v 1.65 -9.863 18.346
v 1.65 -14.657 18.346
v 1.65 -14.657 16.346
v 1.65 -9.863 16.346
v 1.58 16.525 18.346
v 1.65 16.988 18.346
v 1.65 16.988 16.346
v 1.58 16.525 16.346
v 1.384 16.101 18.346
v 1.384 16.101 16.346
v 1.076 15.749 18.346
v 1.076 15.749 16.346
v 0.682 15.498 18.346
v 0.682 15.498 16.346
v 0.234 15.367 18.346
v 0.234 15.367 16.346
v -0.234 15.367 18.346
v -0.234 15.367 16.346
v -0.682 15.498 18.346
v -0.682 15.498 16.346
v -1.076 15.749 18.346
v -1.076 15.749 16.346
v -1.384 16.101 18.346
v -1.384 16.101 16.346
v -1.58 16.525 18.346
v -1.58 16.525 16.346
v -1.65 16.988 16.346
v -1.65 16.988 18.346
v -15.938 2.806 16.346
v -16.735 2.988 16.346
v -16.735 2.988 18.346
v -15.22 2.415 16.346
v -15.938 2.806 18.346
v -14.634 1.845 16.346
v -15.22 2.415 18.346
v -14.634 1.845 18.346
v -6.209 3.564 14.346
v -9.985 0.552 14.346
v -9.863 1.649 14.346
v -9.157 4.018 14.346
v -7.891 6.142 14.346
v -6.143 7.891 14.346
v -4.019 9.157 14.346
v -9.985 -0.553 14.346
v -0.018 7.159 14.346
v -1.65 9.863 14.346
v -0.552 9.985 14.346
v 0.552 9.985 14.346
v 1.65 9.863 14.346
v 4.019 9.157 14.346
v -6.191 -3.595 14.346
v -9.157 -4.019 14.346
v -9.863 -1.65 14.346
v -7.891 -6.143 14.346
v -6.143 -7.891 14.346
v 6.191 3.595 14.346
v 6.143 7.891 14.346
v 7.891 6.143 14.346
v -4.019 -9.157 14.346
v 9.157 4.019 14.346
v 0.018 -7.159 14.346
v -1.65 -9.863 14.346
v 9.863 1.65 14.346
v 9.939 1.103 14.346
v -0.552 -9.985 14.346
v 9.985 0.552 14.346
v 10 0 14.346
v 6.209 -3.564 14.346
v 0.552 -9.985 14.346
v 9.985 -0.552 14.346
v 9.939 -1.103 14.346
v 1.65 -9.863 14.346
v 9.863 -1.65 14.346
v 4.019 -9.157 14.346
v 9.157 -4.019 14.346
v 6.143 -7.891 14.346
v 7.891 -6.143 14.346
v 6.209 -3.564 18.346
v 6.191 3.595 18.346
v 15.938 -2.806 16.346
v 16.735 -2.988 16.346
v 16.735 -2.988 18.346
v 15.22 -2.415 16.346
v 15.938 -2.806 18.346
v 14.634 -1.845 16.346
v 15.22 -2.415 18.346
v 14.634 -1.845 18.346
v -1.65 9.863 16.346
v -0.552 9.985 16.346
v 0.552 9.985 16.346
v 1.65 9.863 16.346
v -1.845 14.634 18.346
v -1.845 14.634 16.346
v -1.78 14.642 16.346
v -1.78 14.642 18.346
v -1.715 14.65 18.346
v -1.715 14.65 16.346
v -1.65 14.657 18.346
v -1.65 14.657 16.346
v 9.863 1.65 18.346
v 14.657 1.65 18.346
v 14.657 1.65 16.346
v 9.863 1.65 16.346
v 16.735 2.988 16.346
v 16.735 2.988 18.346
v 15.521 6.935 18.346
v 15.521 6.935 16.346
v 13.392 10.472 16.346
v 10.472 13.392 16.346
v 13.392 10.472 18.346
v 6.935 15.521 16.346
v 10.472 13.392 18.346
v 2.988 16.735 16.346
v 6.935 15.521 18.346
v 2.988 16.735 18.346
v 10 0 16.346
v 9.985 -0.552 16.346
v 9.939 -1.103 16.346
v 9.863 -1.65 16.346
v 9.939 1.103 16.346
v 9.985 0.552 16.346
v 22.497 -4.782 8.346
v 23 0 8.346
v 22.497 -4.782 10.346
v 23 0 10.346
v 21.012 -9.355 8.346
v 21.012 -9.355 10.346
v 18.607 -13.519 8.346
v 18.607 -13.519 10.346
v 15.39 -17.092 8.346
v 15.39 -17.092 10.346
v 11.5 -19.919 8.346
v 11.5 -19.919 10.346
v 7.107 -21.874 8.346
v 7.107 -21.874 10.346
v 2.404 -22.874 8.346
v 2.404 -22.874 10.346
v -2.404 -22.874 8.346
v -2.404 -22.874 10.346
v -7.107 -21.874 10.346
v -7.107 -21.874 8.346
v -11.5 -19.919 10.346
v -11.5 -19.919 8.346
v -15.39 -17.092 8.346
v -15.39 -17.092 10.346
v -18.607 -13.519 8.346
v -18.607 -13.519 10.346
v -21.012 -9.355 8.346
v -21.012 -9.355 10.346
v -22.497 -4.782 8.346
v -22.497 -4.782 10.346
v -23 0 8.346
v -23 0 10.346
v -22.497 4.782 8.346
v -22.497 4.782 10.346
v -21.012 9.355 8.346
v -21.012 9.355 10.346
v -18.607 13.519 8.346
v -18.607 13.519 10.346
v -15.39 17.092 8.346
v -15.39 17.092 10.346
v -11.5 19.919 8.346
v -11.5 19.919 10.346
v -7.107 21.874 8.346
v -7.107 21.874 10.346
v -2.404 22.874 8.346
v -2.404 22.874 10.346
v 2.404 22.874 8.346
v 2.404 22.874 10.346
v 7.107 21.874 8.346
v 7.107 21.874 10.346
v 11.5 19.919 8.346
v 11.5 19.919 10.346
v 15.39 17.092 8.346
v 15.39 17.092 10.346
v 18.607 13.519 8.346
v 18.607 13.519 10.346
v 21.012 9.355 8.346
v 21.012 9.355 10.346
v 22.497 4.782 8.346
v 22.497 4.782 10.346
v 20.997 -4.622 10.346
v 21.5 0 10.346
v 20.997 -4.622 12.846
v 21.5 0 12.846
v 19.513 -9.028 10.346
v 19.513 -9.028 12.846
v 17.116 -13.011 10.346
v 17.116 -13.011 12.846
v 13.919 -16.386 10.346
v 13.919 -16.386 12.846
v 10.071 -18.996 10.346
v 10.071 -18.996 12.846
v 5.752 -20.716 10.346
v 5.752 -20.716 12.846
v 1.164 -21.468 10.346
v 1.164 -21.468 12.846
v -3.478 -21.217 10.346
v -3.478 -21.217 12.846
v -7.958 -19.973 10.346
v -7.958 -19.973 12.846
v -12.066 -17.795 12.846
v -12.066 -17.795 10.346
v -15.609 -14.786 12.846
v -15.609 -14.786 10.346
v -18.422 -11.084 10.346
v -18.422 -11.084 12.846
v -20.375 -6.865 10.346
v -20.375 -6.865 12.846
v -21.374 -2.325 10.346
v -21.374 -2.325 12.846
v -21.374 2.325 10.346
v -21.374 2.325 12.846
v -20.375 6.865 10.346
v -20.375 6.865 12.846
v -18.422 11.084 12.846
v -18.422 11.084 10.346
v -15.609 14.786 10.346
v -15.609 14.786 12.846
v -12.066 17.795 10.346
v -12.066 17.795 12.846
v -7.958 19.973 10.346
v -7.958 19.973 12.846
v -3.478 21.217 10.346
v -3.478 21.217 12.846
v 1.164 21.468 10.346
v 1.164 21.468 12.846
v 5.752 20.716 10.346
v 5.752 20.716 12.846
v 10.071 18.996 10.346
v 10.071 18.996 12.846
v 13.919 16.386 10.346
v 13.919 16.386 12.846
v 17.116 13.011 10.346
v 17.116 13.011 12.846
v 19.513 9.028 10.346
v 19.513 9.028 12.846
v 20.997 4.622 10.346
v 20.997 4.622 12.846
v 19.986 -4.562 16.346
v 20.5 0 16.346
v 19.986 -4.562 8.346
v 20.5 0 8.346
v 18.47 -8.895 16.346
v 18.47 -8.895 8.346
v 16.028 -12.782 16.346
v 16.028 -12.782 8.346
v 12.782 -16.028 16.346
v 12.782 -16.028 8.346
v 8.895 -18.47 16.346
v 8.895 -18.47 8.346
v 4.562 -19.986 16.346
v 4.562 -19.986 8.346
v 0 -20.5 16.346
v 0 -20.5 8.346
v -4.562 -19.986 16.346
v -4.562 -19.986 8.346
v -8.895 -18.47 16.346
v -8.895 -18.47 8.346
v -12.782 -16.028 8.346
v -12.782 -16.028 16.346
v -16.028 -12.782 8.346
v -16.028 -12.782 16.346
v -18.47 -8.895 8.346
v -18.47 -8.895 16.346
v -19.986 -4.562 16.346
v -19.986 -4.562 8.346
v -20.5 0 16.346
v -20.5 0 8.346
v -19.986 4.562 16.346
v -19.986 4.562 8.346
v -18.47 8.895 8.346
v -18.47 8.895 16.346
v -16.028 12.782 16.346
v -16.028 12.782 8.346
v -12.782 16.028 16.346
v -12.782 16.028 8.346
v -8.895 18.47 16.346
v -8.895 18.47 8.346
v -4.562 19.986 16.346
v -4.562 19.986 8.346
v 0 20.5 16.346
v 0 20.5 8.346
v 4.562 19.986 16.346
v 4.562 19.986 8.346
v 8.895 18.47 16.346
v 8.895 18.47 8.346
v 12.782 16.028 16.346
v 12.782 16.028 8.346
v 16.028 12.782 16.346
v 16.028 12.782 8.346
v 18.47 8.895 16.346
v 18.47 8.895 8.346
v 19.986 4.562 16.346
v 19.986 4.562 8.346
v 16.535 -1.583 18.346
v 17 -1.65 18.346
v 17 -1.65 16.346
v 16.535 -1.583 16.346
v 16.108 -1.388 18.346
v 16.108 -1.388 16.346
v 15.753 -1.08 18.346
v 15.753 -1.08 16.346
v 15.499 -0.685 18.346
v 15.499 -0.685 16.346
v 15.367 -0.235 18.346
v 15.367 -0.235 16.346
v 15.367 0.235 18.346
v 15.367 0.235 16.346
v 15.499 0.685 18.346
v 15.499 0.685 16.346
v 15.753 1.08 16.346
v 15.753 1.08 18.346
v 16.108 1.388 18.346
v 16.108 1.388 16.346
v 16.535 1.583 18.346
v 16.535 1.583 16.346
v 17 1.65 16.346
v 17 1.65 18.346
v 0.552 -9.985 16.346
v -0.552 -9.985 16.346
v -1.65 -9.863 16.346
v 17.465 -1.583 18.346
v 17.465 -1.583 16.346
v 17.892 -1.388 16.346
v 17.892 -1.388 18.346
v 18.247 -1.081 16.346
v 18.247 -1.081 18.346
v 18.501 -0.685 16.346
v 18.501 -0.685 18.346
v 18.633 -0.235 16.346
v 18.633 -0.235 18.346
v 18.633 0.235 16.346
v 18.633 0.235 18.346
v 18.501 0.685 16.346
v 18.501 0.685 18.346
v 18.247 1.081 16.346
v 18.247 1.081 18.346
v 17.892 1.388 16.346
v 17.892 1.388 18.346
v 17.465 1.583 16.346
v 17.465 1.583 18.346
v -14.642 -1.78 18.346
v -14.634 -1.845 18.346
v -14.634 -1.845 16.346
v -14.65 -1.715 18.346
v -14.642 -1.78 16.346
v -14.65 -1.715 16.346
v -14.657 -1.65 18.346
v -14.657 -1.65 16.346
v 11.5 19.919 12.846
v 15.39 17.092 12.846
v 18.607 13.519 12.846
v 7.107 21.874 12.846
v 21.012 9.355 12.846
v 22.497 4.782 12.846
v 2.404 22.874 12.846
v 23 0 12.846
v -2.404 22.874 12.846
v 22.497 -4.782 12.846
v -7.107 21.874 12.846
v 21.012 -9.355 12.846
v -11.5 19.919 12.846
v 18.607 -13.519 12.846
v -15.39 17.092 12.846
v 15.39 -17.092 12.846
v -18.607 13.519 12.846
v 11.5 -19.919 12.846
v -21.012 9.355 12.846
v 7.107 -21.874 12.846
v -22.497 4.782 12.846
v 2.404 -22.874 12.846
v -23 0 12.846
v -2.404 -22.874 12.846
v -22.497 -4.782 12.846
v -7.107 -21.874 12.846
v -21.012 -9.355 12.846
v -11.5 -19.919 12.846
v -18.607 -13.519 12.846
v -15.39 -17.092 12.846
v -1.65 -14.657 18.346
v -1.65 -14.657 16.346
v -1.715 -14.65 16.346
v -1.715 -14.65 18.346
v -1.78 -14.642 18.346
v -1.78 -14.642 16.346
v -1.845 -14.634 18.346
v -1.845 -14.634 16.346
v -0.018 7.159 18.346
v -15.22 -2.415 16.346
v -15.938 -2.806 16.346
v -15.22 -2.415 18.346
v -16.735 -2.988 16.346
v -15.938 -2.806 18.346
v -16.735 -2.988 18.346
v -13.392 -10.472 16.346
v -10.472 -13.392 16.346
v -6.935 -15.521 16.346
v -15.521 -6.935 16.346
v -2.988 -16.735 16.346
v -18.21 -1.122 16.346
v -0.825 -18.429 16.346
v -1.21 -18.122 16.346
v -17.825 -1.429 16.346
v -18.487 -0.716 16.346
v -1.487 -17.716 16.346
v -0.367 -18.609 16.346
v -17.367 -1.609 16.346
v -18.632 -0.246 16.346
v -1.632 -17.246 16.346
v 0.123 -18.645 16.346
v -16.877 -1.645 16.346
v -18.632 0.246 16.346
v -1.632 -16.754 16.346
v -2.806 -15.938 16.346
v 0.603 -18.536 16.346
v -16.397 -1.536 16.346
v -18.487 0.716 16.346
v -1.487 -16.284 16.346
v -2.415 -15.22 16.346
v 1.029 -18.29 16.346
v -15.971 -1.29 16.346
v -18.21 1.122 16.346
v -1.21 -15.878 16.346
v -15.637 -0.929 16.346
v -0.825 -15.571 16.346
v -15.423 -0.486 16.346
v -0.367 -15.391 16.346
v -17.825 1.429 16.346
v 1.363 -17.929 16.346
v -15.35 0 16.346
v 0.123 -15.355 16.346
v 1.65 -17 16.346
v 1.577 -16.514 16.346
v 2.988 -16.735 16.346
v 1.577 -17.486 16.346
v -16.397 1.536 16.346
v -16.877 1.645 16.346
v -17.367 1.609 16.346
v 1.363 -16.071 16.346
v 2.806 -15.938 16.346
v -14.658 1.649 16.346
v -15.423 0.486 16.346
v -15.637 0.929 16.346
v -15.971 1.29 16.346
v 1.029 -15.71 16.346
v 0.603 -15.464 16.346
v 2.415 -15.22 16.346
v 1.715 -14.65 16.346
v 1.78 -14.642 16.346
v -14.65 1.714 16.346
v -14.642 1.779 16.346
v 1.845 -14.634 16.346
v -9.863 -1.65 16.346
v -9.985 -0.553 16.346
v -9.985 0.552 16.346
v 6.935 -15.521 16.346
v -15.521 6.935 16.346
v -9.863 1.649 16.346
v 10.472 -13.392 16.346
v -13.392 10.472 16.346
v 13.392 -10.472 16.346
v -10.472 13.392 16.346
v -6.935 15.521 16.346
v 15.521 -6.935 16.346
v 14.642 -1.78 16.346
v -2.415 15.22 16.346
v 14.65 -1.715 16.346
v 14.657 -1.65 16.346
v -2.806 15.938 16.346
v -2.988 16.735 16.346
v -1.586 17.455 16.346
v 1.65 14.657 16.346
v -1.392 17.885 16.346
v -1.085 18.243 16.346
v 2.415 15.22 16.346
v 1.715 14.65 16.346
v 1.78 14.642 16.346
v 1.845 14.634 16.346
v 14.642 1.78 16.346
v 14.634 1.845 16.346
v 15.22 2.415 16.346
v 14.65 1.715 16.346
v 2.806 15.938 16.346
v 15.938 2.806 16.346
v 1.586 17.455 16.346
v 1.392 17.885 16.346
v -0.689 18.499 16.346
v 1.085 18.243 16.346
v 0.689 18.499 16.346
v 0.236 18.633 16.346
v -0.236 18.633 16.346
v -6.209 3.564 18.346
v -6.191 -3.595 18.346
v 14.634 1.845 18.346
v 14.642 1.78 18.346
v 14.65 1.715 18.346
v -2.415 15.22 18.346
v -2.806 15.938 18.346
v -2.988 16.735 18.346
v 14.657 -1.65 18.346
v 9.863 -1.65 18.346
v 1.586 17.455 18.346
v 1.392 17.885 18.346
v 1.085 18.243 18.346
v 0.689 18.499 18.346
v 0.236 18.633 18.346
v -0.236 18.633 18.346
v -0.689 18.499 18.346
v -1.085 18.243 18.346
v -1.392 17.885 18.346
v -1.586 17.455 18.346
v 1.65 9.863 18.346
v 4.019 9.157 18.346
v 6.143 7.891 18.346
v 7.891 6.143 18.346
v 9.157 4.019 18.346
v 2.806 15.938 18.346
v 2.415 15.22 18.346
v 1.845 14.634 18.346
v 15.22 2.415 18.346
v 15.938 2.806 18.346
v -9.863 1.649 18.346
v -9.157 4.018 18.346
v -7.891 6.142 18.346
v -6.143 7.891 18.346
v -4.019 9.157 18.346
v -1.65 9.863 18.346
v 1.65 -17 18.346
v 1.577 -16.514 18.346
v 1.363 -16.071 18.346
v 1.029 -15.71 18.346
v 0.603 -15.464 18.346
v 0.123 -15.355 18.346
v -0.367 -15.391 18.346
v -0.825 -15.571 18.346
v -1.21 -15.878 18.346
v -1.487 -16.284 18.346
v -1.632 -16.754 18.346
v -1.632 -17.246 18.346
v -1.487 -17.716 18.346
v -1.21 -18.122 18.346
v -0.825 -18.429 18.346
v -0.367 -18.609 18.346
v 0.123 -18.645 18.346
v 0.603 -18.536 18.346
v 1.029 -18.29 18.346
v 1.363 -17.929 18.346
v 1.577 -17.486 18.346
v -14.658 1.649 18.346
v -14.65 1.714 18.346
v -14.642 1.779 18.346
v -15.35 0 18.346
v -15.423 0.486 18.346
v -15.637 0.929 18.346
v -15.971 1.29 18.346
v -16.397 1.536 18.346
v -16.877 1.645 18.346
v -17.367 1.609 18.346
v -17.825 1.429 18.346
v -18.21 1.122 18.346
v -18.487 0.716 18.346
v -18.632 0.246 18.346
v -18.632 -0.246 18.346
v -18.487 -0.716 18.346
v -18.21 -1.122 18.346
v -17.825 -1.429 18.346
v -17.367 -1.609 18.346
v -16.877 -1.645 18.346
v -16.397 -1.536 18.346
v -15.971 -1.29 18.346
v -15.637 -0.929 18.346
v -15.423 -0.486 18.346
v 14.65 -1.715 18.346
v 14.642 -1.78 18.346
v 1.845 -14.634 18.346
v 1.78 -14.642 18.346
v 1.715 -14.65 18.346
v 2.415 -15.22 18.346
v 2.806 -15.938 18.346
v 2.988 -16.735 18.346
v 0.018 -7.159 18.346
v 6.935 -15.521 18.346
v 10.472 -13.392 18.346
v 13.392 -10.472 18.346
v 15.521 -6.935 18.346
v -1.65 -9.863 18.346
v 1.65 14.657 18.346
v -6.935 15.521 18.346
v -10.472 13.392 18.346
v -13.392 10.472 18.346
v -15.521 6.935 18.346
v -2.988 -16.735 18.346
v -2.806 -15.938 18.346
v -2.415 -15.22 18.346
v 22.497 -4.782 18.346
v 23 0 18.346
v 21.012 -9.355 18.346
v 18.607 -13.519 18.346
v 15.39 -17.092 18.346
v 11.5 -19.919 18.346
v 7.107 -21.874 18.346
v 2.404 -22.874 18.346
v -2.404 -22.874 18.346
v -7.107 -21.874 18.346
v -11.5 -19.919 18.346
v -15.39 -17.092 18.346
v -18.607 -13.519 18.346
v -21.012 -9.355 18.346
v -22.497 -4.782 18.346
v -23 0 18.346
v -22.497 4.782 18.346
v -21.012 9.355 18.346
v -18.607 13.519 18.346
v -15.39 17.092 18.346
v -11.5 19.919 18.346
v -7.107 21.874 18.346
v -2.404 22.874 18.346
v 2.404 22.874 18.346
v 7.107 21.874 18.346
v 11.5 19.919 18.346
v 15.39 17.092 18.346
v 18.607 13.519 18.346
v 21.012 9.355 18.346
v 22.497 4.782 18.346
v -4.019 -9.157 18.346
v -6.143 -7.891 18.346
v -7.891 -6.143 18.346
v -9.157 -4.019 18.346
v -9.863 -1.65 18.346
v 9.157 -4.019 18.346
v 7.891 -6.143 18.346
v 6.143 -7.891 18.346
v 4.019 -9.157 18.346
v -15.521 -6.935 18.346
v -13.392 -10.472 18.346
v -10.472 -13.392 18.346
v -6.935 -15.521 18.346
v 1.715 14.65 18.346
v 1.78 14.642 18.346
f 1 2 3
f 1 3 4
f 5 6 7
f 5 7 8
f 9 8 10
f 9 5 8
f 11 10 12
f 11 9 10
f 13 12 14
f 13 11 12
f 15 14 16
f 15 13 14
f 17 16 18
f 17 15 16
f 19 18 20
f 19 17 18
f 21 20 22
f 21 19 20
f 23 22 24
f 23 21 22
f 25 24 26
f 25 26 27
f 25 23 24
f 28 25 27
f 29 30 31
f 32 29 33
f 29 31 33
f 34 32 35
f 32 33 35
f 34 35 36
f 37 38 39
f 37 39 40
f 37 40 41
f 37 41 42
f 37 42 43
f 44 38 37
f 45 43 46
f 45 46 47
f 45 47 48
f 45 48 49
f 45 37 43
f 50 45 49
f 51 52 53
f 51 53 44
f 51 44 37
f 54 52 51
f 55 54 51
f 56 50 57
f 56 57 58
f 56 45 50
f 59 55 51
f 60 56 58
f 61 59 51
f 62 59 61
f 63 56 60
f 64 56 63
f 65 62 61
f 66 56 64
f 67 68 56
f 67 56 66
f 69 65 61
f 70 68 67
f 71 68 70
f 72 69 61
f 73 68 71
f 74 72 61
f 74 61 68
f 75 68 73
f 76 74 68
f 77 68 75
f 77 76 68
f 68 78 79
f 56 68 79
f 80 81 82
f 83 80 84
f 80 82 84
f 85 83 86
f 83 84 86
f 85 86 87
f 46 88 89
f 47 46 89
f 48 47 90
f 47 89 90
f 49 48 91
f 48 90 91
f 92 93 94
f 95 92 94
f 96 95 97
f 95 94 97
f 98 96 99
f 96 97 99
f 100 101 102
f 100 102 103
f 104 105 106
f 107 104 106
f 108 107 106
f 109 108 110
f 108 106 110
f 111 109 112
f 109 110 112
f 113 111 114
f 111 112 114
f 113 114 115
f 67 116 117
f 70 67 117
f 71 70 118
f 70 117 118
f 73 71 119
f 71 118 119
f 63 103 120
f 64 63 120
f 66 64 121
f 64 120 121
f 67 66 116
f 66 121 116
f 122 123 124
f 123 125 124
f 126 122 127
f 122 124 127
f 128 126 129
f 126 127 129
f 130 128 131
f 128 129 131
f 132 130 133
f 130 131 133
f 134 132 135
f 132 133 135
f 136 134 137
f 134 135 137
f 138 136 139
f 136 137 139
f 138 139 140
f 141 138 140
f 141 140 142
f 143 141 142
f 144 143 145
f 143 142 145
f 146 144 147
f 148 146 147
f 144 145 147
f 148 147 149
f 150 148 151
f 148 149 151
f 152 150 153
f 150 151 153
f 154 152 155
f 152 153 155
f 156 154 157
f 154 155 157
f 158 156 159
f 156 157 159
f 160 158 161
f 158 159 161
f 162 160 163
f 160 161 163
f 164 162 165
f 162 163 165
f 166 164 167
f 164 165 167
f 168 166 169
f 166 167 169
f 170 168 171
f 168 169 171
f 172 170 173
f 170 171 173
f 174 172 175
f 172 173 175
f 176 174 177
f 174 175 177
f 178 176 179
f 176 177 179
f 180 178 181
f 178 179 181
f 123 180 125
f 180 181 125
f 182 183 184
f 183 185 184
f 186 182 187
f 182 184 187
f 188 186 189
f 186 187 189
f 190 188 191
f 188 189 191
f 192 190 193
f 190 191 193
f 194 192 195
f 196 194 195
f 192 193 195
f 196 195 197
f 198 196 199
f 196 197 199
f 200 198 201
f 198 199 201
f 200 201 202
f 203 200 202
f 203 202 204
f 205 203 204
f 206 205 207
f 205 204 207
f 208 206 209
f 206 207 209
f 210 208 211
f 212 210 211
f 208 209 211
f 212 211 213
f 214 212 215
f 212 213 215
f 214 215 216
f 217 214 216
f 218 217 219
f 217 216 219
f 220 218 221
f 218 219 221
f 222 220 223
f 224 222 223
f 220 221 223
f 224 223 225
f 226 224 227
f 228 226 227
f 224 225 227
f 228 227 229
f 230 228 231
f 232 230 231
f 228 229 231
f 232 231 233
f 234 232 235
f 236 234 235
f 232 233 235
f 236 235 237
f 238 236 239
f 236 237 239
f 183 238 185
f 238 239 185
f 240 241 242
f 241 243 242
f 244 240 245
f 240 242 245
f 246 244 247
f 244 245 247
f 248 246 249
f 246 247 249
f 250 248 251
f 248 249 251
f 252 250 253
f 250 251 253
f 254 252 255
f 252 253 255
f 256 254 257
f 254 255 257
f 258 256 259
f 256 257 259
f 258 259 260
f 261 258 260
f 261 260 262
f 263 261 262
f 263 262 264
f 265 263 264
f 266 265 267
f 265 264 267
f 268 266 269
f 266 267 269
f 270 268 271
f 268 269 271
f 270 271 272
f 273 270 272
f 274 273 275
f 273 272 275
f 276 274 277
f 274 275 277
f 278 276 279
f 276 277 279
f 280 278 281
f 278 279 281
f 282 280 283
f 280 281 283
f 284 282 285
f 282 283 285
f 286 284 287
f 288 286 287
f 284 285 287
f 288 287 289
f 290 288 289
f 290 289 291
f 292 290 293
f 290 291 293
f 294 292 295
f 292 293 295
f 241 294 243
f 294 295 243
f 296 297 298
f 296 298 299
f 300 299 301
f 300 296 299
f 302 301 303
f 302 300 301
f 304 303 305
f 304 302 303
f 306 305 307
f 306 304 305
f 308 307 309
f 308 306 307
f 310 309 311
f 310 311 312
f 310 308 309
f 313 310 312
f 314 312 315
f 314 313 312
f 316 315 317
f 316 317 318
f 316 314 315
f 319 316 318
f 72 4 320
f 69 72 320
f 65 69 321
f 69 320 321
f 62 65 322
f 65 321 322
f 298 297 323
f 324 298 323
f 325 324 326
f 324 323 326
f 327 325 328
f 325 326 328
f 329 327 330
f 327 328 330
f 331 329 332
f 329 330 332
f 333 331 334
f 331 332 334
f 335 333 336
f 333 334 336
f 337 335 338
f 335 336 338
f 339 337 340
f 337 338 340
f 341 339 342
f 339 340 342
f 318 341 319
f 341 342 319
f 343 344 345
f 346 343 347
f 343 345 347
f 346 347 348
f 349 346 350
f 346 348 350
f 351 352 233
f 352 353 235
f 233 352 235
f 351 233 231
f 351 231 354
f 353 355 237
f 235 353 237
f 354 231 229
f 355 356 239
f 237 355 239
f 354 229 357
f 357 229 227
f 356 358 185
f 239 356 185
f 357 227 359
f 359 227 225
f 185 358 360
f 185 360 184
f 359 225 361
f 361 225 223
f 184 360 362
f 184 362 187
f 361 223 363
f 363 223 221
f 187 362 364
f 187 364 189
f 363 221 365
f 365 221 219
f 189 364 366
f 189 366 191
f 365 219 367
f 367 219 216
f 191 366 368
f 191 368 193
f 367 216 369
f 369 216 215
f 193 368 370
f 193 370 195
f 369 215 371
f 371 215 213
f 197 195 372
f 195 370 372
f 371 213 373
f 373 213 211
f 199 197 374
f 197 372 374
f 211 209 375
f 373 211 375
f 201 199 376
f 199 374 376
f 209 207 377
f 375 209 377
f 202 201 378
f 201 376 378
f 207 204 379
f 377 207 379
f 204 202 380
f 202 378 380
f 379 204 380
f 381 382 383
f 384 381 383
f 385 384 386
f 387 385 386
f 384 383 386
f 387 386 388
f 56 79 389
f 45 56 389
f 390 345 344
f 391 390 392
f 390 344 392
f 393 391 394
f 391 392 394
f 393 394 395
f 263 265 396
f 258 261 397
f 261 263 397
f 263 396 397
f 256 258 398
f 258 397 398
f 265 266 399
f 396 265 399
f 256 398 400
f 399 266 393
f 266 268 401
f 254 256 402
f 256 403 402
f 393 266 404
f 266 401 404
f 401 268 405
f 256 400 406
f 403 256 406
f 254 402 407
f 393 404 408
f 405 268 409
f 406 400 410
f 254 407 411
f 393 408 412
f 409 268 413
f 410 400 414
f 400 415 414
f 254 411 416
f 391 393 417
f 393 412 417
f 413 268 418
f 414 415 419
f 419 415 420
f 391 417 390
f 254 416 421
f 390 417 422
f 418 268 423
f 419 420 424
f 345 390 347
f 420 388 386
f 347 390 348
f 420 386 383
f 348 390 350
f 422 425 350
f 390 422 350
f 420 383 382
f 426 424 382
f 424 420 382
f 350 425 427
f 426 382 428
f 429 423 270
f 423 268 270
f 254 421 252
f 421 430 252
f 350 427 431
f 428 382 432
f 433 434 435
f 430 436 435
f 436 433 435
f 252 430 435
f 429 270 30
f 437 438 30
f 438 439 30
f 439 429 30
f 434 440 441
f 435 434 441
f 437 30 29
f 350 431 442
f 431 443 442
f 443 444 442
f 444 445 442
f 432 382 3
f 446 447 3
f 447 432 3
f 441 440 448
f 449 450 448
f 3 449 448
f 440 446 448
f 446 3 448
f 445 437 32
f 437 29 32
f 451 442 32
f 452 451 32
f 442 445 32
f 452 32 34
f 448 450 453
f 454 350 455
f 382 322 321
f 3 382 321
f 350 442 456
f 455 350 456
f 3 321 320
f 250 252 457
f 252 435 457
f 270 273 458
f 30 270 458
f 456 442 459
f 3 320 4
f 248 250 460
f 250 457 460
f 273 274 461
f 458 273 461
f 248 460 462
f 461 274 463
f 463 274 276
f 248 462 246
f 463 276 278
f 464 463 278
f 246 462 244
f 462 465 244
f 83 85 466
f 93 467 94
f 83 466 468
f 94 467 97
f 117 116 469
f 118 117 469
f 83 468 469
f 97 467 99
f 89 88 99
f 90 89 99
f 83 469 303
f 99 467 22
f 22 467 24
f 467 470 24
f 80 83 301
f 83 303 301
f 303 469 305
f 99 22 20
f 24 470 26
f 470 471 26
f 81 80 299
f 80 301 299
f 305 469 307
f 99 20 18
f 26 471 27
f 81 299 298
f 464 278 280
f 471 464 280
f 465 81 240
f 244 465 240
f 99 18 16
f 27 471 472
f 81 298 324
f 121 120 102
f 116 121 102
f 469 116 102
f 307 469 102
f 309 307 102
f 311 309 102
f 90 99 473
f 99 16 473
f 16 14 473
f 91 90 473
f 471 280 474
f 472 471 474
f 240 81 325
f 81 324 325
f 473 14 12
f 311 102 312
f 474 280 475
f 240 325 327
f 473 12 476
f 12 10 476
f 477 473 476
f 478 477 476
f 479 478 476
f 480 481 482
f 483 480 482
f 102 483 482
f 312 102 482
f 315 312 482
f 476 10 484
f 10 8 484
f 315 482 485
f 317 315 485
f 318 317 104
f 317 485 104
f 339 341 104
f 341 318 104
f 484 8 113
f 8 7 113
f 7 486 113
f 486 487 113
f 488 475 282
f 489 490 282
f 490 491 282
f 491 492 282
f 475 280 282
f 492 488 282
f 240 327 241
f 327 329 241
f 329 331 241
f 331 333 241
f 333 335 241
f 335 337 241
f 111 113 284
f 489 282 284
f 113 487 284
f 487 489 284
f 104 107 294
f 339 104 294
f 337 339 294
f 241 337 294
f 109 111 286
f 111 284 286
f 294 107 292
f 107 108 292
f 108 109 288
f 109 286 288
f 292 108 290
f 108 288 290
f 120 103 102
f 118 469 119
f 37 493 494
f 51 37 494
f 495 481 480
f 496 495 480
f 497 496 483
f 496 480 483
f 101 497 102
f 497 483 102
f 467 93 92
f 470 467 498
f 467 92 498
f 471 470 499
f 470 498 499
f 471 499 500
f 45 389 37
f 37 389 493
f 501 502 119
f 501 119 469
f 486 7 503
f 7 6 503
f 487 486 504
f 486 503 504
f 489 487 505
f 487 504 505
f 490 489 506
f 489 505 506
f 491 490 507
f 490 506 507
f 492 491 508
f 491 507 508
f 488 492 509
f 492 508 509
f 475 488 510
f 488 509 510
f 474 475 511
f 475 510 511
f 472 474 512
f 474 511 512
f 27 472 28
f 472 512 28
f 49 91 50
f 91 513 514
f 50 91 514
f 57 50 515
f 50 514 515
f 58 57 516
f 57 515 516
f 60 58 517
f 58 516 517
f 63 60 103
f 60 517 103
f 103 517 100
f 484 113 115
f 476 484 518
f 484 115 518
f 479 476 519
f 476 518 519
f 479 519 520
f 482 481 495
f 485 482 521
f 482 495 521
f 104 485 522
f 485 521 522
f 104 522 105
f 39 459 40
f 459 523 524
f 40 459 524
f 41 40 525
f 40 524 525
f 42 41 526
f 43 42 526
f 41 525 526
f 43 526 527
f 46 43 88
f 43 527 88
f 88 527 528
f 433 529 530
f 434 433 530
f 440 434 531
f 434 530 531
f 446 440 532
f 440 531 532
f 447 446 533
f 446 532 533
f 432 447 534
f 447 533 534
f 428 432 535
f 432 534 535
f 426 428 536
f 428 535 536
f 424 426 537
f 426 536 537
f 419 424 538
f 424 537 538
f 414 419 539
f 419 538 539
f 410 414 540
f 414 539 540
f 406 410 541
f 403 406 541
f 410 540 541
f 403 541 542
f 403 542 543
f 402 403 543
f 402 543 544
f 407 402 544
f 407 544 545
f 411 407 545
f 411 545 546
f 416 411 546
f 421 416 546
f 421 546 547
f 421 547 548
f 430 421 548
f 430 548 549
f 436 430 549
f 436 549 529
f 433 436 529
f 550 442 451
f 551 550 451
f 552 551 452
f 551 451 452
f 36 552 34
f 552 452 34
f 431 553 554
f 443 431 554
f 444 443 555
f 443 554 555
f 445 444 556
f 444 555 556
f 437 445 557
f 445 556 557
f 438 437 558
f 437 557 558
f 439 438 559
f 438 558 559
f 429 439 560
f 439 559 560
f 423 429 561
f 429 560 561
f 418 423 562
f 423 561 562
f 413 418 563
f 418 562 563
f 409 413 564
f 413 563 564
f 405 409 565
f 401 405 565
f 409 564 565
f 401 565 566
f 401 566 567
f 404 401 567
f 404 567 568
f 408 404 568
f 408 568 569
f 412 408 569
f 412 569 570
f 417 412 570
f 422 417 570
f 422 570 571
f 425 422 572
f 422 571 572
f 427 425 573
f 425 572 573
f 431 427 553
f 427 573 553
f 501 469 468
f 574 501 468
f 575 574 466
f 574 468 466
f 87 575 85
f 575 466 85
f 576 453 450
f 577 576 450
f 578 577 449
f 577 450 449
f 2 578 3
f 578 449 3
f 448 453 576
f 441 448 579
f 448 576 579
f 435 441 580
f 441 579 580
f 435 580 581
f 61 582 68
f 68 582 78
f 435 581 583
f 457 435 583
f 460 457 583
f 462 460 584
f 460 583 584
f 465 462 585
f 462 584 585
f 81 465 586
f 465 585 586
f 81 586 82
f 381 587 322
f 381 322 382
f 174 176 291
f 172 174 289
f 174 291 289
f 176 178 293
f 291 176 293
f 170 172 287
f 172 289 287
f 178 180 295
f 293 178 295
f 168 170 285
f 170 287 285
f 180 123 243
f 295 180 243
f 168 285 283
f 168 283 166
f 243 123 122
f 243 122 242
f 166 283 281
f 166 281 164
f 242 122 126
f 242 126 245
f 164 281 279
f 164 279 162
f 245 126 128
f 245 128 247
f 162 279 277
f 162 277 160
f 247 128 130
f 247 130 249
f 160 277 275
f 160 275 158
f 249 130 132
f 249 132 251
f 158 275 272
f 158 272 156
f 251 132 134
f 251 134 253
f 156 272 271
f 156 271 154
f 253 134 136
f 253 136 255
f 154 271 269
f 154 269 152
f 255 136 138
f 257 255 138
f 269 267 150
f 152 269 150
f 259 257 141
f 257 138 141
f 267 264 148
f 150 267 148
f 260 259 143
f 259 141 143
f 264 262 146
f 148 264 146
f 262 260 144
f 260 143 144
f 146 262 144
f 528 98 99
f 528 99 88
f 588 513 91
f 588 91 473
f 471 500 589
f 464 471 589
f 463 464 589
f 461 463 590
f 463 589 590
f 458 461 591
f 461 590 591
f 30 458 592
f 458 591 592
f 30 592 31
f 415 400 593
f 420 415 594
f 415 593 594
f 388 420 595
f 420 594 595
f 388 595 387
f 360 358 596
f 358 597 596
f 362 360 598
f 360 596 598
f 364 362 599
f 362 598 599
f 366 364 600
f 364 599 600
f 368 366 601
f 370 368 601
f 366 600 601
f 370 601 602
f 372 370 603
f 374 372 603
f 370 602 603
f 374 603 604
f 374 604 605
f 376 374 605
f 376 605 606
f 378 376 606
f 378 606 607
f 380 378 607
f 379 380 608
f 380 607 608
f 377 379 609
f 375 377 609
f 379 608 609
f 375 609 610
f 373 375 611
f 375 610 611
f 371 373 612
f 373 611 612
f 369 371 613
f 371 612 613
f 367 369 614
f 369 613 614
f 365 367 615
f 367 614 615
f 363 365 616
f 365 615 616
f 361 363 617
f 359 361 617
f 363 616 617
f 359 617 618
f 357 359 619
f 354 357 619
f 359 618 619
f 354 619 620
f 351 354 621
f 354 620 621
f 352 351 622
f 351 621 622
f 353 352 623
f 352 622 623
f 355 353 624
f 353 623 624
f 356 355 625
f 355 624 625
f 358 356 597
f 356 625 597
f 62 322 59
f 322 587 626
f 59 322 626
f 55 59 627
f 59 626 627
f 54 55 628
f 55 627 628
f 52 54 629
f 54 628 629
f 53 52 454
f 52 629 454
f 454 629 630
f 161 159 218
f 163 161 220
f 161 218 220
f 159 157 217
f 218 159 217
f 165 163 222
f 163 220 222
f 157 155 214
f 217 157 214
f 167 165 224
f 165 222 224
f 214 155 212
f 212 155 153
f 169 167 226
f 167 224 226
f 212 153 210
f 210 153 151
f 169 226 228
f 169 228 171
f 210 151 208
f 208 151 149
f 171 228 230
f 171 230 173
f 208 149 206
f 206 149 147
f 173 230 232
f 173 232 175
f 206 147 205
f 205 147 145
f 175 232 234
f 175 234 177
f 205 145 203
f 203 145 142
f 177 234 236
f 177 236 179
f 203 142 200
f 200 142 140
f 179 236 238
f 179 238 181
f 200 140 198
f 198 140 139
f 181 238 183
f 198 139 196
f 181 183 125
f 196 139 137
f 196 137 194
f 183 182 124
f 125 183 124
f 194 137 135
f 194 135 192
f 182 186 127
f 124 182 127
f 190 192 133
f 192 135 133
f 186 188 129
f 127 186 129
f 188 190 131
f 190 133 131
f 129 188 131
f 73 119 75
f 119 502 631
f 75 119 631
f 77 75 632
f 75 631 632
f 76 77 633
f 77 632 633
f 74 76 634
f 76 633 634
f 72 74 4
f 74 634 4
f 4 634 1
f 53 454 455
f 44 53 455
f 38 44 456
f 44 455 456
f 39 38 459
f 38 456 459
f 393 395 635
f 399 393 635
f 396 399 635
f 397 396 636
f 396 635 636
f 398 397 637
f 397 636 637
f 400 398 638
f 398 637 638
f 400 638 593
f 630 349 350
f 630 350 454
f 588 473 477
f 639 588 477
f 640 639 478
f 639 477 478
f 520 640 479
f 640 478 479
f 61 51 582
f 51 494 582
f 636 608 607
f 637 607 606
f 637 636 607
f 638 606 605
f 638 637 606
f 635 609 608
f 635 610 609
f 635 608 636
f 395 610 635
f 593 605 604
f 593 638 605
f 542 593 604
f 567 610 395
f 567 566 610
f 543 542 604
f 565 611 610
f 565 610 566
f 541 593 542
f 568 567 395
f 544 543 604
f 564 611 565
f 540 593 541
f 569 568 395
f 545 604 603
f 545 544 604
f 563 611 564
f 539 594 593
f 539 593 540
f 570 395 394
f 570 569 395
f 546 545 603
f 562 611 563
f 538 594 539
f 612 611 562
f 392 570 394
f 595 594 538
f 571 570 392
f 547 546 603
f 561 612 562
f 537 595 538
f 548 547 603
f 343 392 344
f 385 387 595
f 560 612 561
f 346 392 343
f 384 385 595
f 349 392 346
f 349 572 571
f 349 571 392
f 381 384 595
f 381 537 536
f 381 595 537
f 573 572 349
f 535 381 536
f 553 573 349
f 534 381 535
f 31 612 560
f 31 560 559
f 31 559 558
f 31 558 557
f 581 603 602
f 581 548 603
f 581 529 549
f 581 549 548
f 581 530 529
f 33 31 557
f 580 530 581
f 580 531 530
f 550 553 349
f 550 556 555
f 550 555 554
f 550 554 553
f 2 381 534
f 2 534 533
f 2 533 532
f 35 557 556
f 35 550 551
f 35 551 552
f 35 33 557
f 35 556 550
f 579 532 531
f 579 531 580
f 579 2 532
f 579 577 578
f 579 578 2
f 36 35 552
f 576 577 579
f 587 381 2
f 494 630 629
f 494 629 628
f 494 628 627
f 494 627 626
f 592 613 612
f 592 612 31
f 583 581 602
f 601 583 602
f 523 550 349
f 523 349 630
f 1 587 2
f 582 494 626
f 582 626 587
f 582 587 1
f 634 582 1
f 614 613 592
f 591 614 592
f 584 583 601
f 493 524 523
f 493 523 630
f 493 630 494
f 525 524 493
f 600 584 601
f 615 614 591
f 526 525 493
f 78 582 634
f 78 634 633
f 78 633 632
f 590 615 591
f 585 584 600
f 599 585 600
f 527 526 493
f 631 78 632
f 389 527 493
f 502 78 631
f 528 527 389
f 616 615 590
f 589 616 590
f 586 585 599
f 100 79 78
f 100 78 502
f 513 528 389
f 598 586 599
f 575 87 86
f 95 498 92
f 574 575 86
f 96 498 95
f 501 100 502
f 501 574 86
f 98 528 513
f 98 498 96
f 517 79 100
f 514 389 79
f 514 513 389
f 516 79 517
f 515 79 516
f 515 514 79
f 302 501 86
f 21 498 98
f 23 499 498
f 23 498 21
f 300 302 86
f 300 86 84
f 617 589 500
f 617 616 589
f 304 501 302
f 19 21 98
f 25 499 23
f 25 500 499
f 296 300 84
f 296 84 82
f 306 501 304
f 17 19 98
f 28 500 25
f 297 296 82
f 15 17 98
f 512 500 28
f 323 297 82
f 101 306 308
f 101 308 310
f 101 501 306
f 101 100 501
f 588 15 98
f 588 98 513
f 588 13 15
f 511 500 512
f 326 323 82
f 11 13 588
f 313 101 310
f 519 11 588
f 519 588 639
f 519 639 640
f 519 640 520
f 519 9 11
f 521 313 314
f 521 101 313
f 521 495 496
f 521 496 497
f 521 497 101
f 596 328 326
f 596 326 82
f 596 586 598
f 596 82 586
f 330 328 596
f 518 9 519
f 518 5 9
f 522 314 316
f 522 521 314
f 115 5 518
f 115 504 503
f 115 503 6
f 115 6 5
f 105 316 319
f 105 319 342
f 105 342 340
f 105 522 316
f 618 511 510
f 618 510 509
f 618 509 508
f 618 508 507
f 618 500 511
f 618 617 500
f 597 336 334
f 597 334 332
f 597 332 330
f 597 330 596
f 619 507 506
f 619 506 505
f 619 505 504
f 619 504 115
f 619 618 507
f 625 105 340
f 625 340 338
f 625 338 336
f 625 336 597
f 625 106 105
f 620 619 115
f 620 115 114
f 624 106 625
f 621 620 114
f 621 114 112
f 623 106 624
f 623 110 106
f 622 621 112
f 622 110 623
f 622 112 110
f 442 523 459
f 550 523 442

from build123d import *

# Parameters (mm, degrees)
F2_R     = 1.65
F3_DEPTH = 10.001
F5_DEPTH = 2
F7_DEPTH = 10.001
F9_DEPTH = 2


# Not quite as in the source:
# - ends of sketch curves that miss each other by under 0.0002 mm in the source are joined


with BuildPart() as f1:
    # F0 (on Front) → F1 (revolve)
    with BuildSketch(Plane.XZ):
        Polygon((20.5, 16.3456536829), (20.5, 8.3456536829), (23, 8.3456536829), (23, 10.3456536829), (21.5, 10.3456536829), (21.5, 12.8456536829), (23, 12.8456536829), (23, 18.3456536829), (14.75, 18.3456536829), (14.75, 16.3456536829), align=None)
    revolve(axis=Axis((0, 0, 17.3456536829), (0, 0, -1)))

    # F2 (on face) → F3 (cut, through all)
    with BuildSketch(Plane.XY.offset(18.3456536829)):
        with Locations((0, 17)):
            Circle(F2_R)
        with Locations((17, 0)):
            Circle(F2_R)
        with Locations((-17, 0)):
            Circle(F2_R)
        with Locations((0, -17)):
            Circle(F2_R)
    extrude(amount=-F3_DEPTH, mode=Mode.SUBTRACT)

    # F4 (on face) → F5 (join)
    with BuildSketch(Plane.XY.offset(18.3456536829)):
        with BuildLine():
            Line((-1.6499559837, 14.6574262833), (-1.6499626499, 9.8629419168))
            ThreePointArc((-1.6499626499, 9.8629419168), (-7.0714247823, 7.0707108234), (-9.8631084617, 1.6489667897))
            Line((-9.8631084617, 1.6489667897), (-14.6575583453, 1.6487823851))
            ThreePointArc((-14.6575583453, 1.6487823851), (-14.7499999873, -0.0006126499), (-14.6574213285, -1.6499999999))
            Line((-14.6574213285, -1.6499999999), (-9.8629356685, -1.6499999997))
            ThreePointArc((-9.8629356685, -1.6499999997), (-7.0710642548, -7.071071369), (-1.6499900767, -9.8629373285))
            Line((-1.6499900767, -9.8629373285), (-1.6499967429, -14.6574216951))
            ThreePointArc((-1.6499967429, -14.6574216951), (0, -14.75), (1.6499967429, -14.6574216951))
            Line((1.6499967429, -14.6574216951), (1.6499900767, -9.8629373285))
            ThreePointArc((1.6499900767, -9.8629373285), (7.071064255, -7.0710713687), (9.8629356686, -1.649999999))
            Line((9.8629356686, -1.649999999), (14.6574213286, -1.6499999989))
            ThreePointArc((14.6574213286, -1.6499999989), (14.7268371451, -0.8262975866), (14.75, 0))
            ThreePointArc((14.75, 0), (14.7268396846, 0.8262523244), (14.6574314707, 1.6499099011))
            Line((14.6574314707, 1.6499099011), (9.862981587, 1.6497254965))
            ThreePointArc((9.862981587, 1.6497254965), (7.0711528227, 7.0709828), (1.6499626499, 9.8629419168))
            Line((1.6499626499, 9.8629419168), (1.6499559837, 14.6574262833))
            ThreePointArc((1.6499559837, 14.6574262833), (0, 14.75), (-1.6499559837, 14.6574262833))
        make_face()
        with BuildLine():
            Line((-1.649952744, 16.9875123006), (-1.6499559837, 14.6574262833))
            ThreePointArc((-1.6499559837, 14.6574262833), (0, 14.75), (1.6499559837, 14.6574262833))
            Line((1.6499559837, 14.6574262833), (1.649952744, 16.9875123006))
            ThreePointArc((1.649952744, 16.9875123006), (0, 15.35), (-1.649952744, 16.9875123006))
        make_face()
        with BuildLine():
            Line((16.9999365375, 1.6499999988), (14.6574314707, 1.6499099011))
            ThreePointArc((14.6574314707, 1.6499099011), (14.7268396846, 0.8262523244), (14.75, 0))
            ThreePointArc((14.75, 0), (14.7268371451, -0.8262975866), (14.6574213286, -1.6499999989))
            Line((14.6574213286, -1.6499999989), (16.9999365375, -1.6499999988))
            ThreePointArc((16.9999365375, -1.6499999988), (15.35, 0), (16.9999365375, 1.6499999988))
        make_face()
        with BuildLine():
            ThreePointArc((-14.6574213285, -1.6499999999), (-14.7499999873, -0.0006126499), (-14.6575583453, 1.6487823851))
            Line((-14.6575583453, 1.6487823851), (-16.9343843655, 1.6486948136))
            ThreePointArc((-16.9343843655, 1.6486948136), (-15.8103013413, 1.1432922205), (-15.35, 0))
            ThreePointArc((-15.35, 0), (-15.833273811, -1.166726189), (-17, -1.65))
            Line((-17, -1.65), (-14.6574213285, -1.6499999999))
        make_face()
        with BuildLine():
            ThreePointArc((1.6499967429, -14.6574216951), (0, -14.75), (-1.6499967429, -14.6574216951))
            Line((-1.6499967429, -14.6574216951), (-1.65, -16.9999977059))
            ThreePointArc((-1.65, -16.9999977059), (1.1471e-06, -15.35), (1.65, -17))
            Line((1.65, -17), (1.6499967429, -14.6574216951))
        make_face()
    extrude(amount=-F5_DEPTH)

    # F6 (on face) → F7 (cut, through all)
    with BuildSketch(Plane.XY.offset(18.3456536829)):
        with BuildLine():
            ThreePointArc((-1.8447082725, 14.6341911765), (-2.634985421, 15.5658271264), (-2.9882989803, 16.7352941176))
            ThreePointArc((-2.9882989803, 16.7352941176), (-12.0208152802, 12.0208152802), (-16.7352941176, 2.9882989803))
            ThreePointArc((-16.7352941176, 2.9882989803), (-15.5658271264, 2.634985421), (-14.6341911765, 1.8447082725))
            ThreePointArc((-14.6341911765, 1.8447082725), (-10.4298250225, 10.4298250225), (-1.8447082725, 14.6341911765))
        make_face()
        with BuildLine():
            ThreePointArc((2.9882989803, 16.7352941176), (2.634985421, 15.5658271264), (1.8447082725, 14.6341911765))
            ThreePointArc((1.8447082725, 14.6341911765), (10.4298250225, 10.4298250225), (14.6341911765, 1.8447082725))
            ThreePointArc((14.6341911765, 1.8447082725), (15.5658271264, 2.634985421), (16.7352941176, 2.9882989803))
            ThreePointArc((16.7352941176, 2.9882989803), (12.0208152802, 12.0208152802), (2.9882989803, 16.7352941176))
        make_face()
        with BuildLine():
            ThreePointArc((16.7352941176, -2.9882989803), (15.5658271264, -2.634985421), (14.6341911765, -1.8447082725))
            ThreePointArc((14.6341911765, -1.8447082725), (10.4298250225, -10.4298250225), (1.8447082725, -14.6341911765))
            ThreePointArc((1.8447082725, -14.6341911765), (2.634985421, -15.5658271264), (2.9882989803, -16.7352941176))
            ThreePointArc((2.9882989803, -16.7352941176), (12.0208152802, -12.0208152802), (16.7352941176, -2.9882989803))
        make_face()
        with BuildLine():
            ThreePointArc((-1.8447082725, -14.6341911765), (-10.4298250225, -10.4298250225), (-14.6341911765, -1.8447082725))
            ThreePointArc((-14.6341911765, -1.8447082725), (-15.5658271264, -2.634985421), (-16.7352941176, -2.9882989803))
            ThreePointArc((-16.7352941176, -2.9882989803), (-12.0208152802, -12.0208152802), (-2.9882989803, -16.7352941176))
            ThreePointArc((-2.9882989803, -16.7352941176), (-2.634985421, -15.5658271264), (-1.8447082725, -14.6341911765))
        make_face()
        Polygon((0.0182914075, -7.1591199709), (6.2091254673, -3.5637191619), (6.1908340598, 3.595400809), (-0.0182914075, 7.1591199709), (-6.2091254673, 3.5637191619), (-6.1908340598, -3.595400809), align=None)
    extrude(amount=-F7_DEPTH, mode=Mode.SUBTRACT)

    # F8 (on face) → F9 (join)
    with BuildSketch(Plane(origin=(0, 0, 16.3456536829), x_dir=(1, 0, 0), z_dir=(0, 0, -1))):
        with BuildLine():
            ThreePointArc((9.862981587, -1.6497254965), (9.965686526, -0.8277028844), (10, 0))
            ThreePointArc((10, 0), (9.9656750069, 0.8278415651), (9.8629356686, 1.649999999))
            ThreePointArc((9.8629356686, 1.649999999), (7.071064255, 7.0710713687), (1.6499900767, 9.8629373285))
            ThreePointArc((1.6499900767, 9.8629373285), (0, 10), (-1.6499900767, 9.8629373285))
            ThreePointArc((-1.6499900767, 9.8629373285), (-7.0710642548, 7.071071369), (-9.8629356685, 1.6499999997))
            ThreePointArc((-9.8629356685, 1.6499999997), (-9.9999999863, 0.0005237796), (-9.8631084617, -1.6489667897))
            ThreePointArc((-9.8631084617, -1.6489667897), (-7.0714247823, -7.0707108234), (-1.6499626499, -9.8629419168))
            ThreePointArc((-1.6499626499, -9.8629419168), (0, -10), (1.6499626499, -9.8629419168))
            ThreePointArc((1.6499626499, -9.8629419168), (7.0711528227, -7.0709828), (9.862981587, -1.6497254965))
        make_face()
        Polygon((-6.1908340598, 3.595400809), (0.0182914075, 7.1591199709), (6.2091254673, 3.5637191619), (6.1908340598, -3.595400809), (-0.0182914075, -7.1591199709), (-6.2091254673, -3.5637191619), align=None, mode=Mode.SUBTRACT)
    extrude(amount=F9_DEPTH)


solid = f1.part
